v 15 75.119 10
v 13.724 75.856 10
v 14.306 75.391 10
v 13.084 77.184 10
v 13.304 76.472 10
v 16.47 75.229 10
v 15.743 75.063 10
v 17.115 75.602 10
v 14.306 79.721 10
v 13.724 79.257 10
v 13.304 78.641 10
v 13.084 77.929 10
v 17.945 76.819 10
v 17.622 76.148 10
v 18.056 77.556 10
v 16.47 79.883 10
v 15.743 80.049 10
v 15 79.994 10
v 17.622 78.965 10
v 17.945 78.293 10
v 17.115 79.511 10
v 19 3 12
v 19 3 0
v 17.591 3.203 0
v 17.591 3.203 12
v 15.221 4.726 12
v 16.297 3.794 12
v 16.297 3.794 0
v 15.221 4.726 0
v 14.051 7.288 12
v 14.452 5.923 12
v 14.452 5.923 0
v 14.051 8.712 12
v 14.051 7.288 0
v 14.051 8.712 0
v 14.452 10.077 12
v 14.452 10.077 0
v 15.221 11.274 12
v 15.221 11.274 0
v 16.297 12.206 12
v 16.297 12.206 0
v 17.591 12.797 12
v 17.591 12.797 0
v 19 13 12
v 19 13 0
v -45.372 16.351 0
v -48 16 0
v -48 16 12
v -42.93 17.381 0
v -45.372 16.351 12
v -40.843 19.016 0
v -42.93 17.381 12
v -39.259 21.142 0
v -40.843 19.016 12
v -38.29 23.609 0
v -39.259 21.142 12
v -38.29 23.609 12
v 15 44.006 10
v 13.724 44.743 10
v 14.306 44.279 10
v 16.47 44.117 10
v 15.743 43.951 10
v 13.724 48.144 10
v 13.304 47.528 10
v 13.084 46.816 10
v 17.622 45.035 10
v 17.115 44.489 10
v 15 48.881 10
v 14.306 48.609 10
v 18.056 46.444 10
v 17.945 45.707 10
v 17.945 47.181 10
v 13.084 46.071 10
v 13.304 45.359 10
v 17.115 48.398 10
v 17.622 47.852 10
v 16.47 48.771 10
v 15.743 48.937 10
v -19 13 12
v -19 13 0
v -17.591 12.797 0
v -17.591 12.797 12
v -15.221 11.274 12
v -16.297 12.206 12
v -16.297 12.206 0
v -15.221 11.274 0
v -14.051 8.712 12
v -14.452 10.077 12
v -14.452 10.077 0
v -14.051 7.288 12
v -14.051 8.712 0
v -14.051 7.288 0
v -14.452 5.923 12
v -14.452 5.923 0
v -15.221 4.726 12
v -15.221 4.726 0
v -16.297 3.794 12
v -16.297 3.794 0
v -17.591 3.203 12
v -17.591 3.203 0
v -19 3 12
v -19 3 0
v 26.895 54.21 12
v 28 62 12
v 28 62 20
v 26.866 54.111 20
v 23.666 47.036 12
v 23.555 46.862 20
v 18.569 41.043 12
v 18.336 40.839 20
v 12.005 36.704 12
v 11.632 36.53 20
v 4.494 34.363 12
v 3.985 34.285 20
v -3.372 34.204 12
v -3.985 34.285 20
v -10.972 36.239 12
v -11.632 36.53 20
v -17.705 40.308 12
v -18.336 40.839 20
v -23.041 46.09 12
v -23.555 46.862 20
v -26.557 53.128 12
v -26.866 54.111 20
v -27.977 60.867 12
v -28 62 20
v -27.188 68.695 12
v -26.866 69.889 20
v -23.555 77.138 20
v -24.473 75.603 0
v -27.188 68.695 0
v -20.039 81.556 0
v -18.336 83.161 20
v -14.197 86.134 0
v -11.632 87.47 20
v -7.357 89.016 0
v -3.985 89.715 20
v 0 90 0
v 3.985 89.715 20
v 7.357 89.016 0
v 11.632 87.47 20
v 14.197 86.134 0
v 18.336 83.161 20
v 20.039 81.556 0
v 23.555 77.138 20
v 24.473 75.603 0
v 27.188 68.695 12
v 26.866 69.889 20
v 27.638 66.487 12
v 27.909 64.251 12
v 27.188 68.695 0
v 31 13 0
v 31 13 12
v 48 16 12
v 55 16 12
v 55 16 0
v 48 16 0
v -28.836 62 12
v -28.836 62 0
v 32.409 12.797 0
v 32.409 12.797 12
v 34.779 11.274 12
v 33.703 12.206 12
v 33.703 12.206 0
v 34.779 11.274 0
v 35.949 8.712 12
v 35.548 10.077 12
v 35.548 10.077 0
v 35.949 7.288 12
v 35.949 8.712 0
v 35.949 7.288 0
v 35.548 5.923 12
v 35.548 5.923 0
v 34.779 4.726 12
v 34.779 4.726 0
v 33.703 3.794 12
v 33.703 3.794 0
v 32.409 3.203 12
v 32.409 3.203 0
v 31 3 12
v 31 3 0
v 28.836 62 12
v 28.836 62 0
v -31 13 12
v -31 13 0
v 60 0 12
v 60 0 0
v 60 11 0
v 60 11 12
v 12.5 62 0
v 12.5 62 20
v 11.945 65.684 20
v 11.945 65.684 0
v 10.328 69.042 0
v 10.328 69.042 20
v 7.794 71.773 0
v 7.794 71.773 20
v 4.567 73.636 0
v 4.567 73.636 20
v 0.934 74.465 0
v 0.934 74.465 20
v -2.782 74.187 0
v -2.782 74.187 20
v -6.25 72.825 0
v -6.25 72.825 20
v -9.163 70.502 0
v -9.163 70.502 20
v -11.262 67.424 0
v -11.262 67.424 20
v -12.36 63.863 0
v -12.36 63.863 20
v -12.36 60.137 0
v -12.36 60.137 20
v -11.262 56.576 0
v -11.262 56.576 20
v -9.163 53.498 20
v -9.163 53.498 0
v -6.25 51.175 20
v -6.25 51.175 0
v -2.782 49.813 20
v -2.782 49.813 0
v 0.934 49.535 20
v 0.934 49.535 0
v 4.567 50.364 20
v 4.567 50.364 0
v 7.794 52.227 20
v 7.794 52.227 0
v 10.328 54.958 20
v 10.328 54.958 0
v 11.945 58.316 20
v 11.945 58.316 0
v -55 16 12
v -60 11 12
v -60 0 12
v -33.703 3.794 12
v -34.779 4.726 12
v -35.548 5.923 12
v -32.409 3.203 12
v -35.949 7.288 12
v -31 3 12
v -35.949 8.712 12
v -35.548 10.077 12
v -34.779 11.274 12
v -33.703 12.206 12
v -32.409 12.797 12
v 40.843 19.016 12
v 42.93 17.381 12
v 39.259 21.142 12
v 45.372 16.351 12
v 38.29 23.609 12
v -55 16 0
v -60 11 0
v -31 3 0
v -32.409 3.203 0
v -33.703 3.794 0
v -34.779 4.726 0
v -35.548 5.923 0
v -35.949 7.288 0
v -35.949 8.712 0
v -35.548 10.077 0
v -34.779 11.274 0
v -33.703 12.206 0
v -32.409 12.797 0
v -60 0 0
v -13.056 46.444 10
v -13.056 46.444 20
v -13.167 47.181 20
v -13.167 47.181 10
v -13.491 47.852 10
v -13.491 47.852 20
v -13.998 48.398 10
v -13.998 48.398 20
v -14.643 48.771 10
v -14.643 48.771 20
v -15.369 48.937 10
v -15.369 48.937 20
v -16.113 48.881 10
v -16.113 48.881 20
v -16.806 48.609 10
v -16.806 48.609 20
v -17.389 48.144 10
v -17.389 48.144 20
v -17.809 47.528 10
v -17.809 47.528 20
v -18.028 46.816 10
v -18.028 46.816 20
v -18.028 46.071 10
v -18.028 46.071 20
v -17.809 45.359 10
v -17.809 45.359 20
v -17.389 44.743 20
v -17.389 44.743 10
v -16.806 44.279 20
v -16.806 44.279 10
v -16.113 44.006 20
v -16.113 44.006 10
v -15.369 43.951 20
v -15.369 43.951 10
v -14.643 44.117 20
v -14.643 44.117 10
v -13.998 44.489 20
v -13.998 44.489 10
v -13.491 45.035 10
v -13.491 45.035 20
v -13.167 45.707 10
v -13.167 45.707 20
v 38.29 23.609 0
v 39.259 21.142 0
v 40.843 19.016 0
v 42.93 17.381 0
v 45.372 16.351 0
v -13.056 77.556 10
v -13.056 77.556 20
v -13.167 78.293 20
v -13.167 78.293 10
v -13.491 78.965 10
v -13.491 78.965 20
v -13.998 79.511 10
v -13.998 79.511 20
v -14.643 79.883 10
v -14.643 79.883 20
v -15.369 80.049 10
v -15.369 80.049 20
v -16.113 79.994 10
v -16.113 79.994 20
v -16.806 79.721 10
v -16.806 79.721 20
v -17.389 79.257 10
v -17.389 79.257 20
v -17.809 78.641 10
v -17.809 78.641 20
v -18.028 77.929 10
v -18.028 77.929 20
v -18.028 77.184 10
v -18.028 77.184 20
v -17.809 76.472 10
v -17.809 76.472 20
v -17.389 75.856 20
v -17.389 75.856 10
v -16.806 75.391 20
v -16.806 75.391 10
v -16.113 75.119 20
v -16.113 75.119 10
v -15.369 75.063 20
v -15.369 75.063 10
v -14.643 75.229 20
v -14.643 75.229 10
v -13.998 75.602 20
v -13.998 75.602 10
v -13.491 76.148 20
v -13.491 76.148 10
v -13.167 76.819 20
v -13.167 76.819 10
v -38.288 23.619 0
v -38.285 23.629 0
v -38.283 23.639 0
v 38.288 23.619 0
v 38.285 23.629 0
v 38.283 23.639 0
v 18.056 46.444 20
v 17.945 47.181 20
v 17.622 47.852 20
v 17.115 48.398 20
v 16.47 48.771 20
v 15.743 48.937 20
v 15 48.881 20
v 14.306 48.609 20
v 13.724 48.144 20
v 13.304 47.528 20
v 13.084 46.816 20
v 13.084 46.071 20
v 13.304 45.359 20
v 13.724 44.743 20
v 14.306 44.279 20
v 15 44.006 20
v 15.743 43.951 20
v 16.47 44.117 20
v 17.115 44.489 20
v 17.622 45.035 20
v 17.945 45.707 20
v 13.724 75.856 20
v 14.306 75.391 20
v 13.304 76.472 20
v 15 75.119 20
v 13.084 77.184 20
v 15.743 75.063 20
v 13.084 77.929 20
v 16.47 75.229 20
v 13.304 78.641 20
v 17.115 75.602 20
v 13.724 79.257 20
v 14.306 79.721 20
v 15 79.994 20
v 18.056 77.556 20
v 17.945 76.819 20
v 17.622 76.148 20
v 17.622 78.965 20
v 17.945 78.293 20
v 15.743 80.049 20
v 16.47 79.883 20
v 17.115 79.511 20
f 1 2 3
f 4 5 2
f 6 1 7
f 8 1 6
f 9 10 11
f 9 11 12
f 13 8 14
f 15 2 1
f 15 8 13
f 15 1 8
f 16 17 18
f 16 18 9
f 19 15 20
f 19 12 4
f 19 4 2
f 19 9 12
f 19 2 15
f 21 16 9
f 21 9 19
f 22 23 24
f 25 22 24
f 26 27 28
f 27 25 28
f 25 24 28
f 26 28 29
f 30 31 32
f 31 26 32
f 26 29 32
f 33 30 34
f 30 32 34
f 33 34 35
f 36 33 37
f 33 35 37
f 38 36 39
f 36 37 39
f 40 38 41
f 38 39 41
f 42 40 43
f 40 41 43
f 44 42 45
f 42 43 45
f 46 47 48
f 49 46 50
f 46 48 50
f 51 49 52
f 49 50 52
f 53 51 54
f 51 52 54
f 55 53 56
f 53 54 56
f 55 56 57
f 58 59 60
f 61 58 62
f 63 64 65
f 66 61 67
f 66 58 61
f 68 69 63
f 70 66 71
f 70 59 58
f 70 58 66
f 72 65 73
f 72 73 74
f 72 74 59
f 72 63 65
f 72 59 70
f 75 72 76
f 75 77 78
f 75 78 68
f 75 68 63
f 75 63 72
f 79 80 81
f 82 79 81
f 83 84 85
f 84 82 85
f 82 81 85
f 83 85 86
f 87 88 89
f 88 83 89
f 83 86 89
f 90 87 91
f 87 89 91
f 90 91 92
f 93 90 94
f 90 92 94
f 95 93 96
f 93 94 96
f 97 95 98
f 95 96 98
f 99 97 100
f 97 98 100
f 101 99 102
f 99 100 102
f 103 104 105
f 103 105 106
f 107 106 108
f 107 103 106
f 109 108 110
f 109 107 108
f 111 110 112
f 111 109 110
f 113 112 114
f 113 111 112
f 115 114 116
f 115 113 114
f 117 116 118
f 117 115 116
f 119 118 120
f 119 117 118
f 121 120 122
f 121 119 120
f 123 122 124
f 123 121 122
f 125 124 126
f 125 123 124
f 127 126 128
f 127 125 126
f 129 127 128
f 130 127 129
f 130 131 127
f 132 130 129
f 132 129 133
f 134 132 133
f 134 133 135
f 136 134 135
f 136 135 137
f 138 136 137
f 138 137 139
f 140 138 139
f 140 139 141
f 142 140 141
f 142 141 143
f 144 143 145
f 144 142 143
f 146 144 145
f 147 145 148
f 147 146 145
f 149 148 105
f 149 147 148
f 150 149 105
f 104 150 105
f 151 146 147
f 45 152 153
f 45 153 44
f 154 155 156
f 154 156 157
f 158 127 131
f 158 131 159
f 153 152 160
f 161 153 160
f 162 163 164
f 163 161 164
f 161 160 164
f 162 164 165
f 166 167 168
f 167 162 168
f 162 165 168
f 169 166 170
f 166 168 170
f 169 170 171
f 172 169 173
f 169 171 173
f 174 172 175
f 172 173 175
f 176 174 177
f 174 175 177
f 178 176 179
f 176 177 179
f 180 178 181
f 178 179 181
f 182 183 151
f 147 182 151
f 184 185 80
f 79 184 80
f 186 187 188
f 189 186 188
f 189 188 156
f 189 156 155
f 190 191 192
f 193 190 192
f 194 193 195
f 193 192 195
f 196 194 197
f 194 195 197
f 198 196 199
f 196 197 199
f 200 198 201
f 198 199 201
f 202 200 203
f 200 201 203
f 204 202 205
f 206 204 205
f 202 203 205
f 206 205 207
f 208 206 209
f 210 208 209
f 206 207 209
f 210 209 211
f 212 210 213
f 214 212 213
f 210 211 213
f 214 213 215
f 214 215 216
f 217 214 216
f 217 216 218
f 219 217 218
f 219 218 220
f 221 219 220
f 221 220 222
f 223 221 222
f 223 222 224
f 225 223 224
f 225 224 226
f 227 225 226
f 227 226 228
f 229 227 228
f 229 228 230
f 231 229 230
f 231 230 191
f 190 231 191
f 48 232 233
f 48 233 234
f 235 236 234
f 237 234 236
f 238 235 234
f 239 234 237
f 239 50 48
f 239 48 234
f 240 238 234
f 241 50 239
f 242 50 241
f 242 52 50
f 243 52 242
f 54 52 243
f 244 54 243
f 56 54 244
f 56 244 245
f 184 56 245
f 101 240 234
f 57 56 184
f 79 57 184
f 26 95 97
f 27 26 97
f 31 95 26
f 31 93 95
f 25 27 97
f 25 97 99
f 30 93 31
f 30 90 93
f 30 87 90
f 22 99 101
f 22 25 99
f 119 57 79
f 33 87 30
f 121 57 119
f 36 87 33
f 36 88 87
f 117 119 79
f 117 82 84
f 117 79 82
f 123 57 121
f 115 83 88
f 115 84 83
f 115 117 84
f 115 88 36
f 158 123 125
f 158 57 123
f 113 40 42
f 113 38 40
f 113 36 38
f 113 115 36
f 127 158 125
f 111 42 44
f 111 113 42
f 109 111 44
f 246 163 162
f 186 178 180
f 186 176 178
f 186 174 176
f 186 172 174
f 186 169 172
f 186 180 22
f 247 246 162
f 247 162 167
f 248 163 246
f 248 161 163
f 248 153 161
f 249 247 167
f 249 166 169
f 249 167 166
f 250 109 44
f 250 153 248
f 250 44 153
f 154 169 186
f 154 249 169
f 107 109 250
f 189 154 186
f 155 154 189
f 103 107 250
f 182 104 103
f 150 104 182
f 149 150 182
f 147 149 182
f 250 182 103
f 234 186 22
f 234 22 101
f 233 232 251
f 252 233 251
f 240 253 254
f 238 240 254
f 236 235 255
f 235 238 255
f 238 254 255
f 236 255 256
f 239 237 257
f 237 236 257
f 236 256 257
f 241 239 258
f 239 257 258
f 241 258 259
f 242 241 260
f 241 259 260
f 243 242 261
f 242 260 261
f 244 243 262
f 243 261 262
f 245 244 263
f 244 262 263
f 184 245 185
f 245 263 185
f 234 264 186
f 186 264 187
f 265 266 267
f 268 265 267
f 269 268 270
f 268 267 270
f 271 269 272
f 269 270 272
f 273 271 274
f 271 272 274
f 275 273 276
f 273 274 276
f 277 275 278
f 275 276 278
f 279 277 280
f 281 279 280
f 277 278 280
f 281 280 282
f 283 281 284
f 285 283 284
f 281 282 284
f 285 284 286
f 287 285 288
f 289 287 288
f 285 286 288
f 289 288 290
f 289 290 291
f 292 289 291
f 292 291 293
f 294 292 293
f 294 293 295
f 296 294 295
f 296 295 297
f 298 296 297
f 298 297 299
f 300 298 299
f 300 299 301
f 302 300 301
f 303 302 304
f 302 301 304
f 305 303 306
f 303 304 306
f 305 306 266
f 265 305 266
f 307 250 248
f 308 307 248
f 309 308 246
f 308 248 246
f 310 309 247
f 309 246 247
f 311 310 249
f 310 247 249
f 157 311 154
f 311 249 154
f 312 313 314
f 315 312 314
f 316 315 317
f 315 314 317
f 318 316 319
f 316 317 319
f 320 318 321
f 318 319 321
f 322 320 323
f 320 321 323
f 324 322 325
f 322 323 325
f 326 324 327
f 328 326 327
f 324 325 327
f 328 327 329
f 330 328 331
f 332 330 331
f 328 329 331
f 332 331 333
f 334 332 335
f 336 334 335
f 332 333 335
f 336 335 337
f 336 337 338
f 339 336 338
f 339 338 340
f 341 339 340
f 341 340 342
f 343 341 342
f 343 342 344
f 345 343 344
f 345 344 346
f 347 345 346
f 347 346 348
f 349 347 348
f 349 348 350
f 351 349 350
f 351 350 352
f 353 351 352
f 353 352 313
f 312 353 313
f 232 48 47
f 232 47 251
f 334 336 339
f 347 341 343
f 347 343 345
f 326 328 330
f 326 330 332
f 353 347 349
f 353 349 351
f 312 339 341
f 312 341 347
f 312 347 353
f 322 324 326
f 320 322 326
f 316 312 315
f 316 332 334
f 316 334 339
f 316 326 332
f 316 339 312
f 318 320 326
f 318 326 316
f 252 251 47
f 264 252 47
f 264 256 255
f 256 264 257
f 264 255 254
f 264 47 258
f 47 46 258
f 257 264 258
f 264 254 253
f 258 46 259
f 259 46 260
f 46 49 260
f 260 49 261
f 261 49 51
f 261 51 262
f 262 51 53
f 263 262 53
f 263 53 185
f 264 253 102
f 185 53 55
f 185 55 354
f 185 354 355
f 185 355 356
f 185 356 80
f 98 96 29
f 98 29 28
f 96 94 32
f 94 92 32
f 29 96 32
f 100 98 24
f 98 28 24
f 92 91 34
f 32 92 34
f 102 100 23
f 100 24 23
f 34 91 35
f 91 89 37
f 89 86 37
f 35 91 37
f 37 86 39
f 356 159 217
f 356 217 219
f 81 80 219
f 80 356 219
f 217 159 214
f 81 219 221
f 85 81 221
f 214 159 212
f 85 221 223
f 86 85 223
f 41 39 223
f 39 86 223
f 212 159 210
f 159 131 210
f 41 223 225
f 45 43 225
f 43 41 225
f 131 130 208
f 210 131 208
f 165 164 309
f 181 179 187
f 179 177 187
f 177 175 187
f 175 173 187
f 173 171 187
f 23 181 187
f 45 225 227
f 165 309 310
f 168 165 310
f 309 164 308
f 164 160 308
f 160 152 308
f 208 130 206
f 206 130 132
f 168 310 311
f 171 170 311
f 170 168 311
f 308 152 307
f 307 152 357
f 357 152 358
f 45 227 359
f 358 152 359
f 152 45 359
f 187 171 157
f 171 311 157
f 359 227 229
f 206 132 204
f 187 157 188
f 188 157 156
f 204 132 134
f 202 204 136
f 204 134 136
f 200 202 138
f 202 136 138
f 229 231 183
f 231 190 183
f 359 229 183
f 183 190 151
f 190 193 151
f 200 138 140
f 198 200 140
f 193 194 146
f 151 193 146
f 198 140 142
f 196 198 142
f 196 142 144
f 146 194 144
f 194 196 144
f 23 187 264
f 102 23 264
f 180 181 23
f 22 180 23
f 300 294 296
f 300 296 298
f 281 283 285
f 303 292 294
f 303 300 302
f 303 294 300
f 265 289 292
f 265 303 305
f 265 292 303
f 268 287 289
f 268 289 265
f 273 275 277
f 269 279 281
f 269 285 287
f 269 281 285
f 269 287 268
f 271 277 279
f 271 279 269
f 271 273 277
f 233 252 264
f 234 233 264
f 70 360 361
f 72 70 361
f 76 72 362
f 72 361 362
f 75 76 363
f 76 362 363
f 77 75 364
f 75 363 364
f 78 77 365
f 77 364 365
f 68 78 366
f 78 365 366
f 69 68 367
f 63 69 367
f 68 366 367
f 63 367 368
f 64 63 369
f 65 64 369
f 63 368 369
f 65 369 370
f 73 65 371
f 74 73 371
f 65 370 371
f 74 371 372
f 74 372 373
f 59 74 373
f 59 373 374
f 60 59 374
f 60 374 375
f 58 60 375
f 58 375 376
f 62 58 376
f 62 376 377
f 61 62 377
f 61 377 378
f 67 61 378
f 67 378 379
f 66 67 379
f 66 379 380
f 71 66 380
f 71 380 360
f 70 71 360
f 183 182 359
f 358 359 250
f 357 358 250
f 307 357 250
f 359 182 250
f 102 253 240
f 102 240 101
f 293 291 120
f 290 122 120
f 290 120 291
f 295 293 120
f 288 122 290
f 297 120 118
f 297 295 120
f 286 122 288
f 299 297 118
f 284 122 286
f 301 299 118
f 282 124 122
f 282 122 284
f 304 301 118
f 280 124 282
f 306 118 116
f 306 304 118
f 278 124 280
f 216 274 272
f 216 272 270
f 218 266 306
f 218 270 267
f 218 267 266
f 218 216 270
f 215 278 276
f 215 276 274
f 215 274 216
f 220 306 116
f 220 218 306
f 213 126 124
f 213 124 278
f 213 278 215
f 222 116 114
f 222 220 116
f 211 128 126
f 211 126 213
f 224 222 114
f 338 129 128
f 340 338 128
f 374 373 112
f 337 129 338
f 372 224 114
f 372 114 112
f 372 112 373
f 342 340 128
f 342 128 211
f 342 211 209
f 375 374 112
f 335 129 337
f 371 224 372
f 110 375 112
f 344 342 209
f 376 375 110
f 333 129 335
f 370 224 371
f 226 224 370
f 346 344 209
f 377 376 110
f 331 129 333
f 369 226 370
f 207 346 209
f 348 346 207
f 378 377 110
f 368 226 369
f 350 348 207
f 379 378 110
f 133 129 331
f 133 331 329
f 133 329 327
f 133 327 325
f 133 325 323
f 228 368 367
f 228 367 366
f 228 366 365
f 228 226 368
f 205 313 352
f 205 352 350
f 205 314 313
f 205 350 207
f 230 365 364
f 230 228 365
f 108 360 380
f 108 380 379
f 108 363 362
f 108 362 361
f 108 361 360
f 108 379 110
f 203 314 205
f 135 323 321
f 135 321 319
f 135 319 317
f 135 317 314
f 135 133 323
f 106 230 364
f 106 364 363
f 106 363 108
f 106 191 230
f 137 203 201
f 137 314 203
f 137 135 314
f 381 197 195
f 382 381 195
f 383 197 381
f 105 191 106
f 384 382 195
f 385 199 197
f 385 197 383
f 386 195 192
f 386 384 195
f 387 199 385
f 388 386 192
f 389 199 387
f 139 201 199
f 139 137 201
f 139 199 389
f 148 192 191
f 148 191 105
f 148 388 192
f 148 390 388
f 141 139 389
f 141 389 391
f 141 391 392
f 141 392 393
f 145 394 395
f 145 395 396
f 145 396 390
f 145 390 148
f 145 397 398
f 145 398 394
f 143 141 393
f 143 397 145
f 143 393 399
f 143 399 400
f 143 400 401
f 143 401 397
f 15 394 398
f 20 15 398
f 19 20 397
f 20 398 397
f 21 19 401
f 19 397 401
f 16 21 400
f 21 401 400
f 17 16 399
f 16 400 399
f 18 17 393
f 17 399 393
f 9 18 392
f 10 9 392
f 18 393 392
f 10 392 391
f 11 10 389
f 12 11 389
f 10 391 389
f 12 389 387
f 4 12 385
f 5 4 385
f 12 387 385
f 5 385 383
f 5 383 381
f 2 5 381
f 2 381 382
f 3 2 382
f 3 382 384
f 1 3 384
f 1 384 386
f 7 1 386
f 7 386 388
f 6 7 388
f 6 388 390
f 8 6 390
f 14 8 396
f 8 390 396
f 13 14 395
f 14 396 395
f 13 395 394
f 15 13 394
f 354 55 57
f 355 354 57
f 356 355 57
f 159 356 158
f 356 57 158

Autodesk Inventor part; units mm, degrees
ref_plane "YZ Plane" through (0, 0, 0) normal (1, 0, 0) x (0, 1, 0)
ref_plane "XZ Plane" through (0, 0, 0) normal (0, 1, 0) x (-1, 0, 0)
ref_plane "XY Plane" through (0, 0, 0) normal (0, 0, 1) x (1, 0, 0)
sketch "스케치1" plane through (0, 0, 0) normal (0, 0, 1) x (1, 0, 0)
  line L0 (-60, 0) -> (60, 0)
  line L1 (60, 0) -> (60, 62)
  line L2 (-60, 62) -> (-60, 0)
  line L3 (0, 0) -> (0, 151.2751)
  arc A0 (-31, 13) -> (-31, 3) centre (-31, 8) ccw
  arc A1 (-19, 3) -> (-19, 13) centre (-19, 8) ccw
  line L4 (-31, 13) -> (-19, 13)
  line L5 (-31, 3) -> (-19, 3)
  arc A2 (31, 3) -> (31, 13) centre (31, 8) ccw
  arc A3 (19, 13) -> (19, 3) centre (19, 8) ccw
  line L6 (31, 13) -> (19, 13)
  line L7 (31, 3) -> (19, 3)
  arc A4 (28, 62) -> (-28, 62) centre (0, 62) ccw
  line L8 (60, 62) -> (28, 62)
  line L9 (-28, 62) -> (-60, 62)
  dimension "d0" = 120
  dimension "d1" = 62
  dimension "d2" = 29
  dimension "d3" = 10
  dimension "d5" = 10
  dimension "d6" = 12
  dimension "d7" = 56
  dimension "d8" = 8
extrude "돌출1" add sketch "스케치1" along normal blind 12
sketch "스케치2" plane through (0, 0, 12) normal (0, 0, 1) x (1, 0, 0)
  circle A0 centre (0, 62) radius 28
  arc A1 (28, 62) -> (-28, 62) centre (0, 62) ccw projected
  point P0 (0, 0)
  dimension "d11" = 56
extrude "돌출2" add sketch "스케치2" along normal blind 8
sketch "스케치3" plane through (0, 0, 12) normal (0, 0, 1) x (1, 0, 0)
  arc A0 (-48, 16) -> (-48, 36) centre (-48, 26) ccw
  line L0 (-48, 16) -> (-80.7935, 16)
  line L1 (-80.7935, 16) -> (-80.7935, 63.6006)
  line L2 (-80.7935, 63.6006) -> (-48, 63.6006)
  line L3 (-48, 63.6006) -> (-48, 36)
  line L4 (-60, 0) -> (60, 0) projected
  line L5 (-60, 62) -> (-60, 0) projected
  point P0 (0, 0)
  dimension "d14" = 20
  dimension "d15" = 16
  dimension "d16" = 12
extrude "돌출3" cut sketch "스케치3" against normal blind 20
mirror "미러1" about plane through (0, 0, 0) normal (1, 0, 0) of "돌출3"
chamfer "모따기1" distance 5 angle 45 2 edges at (-60, 16, 6) (60, 16, 6)
sketch "스케치4" plane through (0, 0, 12) normal (0, 0, 1) x (1, 0, 0)
  line L0 (-38.2901, 23.609) -> (-27.1878, 68.6949)
  circle A0 centre (0, 62) radius 28 projected
  arc A1 (-48, 16) -> (-48, 36) centre (-48, 26) ccw projected
  line L1 (0, 0) -> (0, 106.1688)
  line L2 (27.1878, 68.6949) -> (38.2901, 23.609)
  arc A2 (48, 36) -> (48, 16) centre (48, 26) ccw projected
  line L3 (-48, 16) -> (-74.8883, 57.476)
  line L4 (-74.8883, 57.476) -> (-15.255, 104.9361)
  line L5 (-15.255, 104.9361) -> (38.38, 97.6952)
  line L6 (38.38, 97.6952) -> (82.1306, 43.6078)
  line L7 (82.1306, 43.6078) -> (48, 16)
extrude "돌출4" cut sketch "스케치4" against normal blind 20 contours A1 L3 L4 L5 L1 A0 L0 | L1 L5 L6 L7 A2 L2 A0
sketch "스케치5" plane through (0, 0, 12) normal (0, 0, 1) x (1, 0, 0)
  line L0 (-38.2901, 23.609) -> (-28.8364, 62) projected
  line L1 (28.8364, 62) -> (28, 62) projected
  line L2 (28.8364, 62) -> (27.1878, 68.6949)
  line L3 (-27.1878, 68.6949) -> (-28.8364, 62)
  circle A0 centre (0, 62) radius 28 projected
  line L4 (-28.8364, 62) -> (-28, 62)
  line L5 (28, 62) -> (28.8364, 62)
  point P0 (0, 0)
extrude "돌출5" add sketch "스케치5" against normal blind 12 contours L1 A0 L2 | L4 L3 A0
sketch "스케치6" plane through (0, 62, 20) normal (0, 0, 1) x (1, 0, 0)
  circle A0 centre (0, 0) radius 12.5
  circle A1 centre (0, 0) radius 22
  circle A2 centre (15.5563, 15.5563) radius 2.5
  line L0 (-28.2851, -28.2851) -> (32.9008, 32.9008)
  line L1 (-49.5291, 0) -> (47.7327, 0)
  circle A3 centre (0, 0) radius 28 projected
  circle A4 centre (-15.5563, 15.5563) radius 2.5
  circle A5 centre (-15.5563, -15.5563) radius 2.5
  circle A6 centre (15.5563, -15.5563) radius 2.5
  point P0 (0, -62)
  dimension "d29" = 44
  dimension "d26" = 45
  dimension "d27" = 5
  dimension "d28" = 25
  dimension "d32" = 360
extrude "돌출6" cut sketch "스케치6" against normal blind 20 contours L1 L0 A0 | A0 L0 L1 | L0 L1 A0 | A0 L1 L0
extrude "돌출7" cut sketch "스케치6" against normal blind 10 contours L0 A1 A2 | A2 A1 L0 | A5 A1 L0 | L0 A1 A5 | A1 L0 A2 | A6 A1 | A1 A6 | A2 L0 A1 | L0 A5 A1 | A1 A5 L0 | A4 A1 | A1 A4
sketch "스케치7" plane through (0, 62, 20) normal (0, 0, 1) x (1, 0, 0)
  circle A0 centre (15.5563, -15.5563) radius 2.5 projected
  circle A1 centre (0, 0) radius 22
  line L0 (0, -76.267) -> (0, 43.2176)
  point P0 (0, -62)
properties part number "아이들러 풀리 브라켓"
